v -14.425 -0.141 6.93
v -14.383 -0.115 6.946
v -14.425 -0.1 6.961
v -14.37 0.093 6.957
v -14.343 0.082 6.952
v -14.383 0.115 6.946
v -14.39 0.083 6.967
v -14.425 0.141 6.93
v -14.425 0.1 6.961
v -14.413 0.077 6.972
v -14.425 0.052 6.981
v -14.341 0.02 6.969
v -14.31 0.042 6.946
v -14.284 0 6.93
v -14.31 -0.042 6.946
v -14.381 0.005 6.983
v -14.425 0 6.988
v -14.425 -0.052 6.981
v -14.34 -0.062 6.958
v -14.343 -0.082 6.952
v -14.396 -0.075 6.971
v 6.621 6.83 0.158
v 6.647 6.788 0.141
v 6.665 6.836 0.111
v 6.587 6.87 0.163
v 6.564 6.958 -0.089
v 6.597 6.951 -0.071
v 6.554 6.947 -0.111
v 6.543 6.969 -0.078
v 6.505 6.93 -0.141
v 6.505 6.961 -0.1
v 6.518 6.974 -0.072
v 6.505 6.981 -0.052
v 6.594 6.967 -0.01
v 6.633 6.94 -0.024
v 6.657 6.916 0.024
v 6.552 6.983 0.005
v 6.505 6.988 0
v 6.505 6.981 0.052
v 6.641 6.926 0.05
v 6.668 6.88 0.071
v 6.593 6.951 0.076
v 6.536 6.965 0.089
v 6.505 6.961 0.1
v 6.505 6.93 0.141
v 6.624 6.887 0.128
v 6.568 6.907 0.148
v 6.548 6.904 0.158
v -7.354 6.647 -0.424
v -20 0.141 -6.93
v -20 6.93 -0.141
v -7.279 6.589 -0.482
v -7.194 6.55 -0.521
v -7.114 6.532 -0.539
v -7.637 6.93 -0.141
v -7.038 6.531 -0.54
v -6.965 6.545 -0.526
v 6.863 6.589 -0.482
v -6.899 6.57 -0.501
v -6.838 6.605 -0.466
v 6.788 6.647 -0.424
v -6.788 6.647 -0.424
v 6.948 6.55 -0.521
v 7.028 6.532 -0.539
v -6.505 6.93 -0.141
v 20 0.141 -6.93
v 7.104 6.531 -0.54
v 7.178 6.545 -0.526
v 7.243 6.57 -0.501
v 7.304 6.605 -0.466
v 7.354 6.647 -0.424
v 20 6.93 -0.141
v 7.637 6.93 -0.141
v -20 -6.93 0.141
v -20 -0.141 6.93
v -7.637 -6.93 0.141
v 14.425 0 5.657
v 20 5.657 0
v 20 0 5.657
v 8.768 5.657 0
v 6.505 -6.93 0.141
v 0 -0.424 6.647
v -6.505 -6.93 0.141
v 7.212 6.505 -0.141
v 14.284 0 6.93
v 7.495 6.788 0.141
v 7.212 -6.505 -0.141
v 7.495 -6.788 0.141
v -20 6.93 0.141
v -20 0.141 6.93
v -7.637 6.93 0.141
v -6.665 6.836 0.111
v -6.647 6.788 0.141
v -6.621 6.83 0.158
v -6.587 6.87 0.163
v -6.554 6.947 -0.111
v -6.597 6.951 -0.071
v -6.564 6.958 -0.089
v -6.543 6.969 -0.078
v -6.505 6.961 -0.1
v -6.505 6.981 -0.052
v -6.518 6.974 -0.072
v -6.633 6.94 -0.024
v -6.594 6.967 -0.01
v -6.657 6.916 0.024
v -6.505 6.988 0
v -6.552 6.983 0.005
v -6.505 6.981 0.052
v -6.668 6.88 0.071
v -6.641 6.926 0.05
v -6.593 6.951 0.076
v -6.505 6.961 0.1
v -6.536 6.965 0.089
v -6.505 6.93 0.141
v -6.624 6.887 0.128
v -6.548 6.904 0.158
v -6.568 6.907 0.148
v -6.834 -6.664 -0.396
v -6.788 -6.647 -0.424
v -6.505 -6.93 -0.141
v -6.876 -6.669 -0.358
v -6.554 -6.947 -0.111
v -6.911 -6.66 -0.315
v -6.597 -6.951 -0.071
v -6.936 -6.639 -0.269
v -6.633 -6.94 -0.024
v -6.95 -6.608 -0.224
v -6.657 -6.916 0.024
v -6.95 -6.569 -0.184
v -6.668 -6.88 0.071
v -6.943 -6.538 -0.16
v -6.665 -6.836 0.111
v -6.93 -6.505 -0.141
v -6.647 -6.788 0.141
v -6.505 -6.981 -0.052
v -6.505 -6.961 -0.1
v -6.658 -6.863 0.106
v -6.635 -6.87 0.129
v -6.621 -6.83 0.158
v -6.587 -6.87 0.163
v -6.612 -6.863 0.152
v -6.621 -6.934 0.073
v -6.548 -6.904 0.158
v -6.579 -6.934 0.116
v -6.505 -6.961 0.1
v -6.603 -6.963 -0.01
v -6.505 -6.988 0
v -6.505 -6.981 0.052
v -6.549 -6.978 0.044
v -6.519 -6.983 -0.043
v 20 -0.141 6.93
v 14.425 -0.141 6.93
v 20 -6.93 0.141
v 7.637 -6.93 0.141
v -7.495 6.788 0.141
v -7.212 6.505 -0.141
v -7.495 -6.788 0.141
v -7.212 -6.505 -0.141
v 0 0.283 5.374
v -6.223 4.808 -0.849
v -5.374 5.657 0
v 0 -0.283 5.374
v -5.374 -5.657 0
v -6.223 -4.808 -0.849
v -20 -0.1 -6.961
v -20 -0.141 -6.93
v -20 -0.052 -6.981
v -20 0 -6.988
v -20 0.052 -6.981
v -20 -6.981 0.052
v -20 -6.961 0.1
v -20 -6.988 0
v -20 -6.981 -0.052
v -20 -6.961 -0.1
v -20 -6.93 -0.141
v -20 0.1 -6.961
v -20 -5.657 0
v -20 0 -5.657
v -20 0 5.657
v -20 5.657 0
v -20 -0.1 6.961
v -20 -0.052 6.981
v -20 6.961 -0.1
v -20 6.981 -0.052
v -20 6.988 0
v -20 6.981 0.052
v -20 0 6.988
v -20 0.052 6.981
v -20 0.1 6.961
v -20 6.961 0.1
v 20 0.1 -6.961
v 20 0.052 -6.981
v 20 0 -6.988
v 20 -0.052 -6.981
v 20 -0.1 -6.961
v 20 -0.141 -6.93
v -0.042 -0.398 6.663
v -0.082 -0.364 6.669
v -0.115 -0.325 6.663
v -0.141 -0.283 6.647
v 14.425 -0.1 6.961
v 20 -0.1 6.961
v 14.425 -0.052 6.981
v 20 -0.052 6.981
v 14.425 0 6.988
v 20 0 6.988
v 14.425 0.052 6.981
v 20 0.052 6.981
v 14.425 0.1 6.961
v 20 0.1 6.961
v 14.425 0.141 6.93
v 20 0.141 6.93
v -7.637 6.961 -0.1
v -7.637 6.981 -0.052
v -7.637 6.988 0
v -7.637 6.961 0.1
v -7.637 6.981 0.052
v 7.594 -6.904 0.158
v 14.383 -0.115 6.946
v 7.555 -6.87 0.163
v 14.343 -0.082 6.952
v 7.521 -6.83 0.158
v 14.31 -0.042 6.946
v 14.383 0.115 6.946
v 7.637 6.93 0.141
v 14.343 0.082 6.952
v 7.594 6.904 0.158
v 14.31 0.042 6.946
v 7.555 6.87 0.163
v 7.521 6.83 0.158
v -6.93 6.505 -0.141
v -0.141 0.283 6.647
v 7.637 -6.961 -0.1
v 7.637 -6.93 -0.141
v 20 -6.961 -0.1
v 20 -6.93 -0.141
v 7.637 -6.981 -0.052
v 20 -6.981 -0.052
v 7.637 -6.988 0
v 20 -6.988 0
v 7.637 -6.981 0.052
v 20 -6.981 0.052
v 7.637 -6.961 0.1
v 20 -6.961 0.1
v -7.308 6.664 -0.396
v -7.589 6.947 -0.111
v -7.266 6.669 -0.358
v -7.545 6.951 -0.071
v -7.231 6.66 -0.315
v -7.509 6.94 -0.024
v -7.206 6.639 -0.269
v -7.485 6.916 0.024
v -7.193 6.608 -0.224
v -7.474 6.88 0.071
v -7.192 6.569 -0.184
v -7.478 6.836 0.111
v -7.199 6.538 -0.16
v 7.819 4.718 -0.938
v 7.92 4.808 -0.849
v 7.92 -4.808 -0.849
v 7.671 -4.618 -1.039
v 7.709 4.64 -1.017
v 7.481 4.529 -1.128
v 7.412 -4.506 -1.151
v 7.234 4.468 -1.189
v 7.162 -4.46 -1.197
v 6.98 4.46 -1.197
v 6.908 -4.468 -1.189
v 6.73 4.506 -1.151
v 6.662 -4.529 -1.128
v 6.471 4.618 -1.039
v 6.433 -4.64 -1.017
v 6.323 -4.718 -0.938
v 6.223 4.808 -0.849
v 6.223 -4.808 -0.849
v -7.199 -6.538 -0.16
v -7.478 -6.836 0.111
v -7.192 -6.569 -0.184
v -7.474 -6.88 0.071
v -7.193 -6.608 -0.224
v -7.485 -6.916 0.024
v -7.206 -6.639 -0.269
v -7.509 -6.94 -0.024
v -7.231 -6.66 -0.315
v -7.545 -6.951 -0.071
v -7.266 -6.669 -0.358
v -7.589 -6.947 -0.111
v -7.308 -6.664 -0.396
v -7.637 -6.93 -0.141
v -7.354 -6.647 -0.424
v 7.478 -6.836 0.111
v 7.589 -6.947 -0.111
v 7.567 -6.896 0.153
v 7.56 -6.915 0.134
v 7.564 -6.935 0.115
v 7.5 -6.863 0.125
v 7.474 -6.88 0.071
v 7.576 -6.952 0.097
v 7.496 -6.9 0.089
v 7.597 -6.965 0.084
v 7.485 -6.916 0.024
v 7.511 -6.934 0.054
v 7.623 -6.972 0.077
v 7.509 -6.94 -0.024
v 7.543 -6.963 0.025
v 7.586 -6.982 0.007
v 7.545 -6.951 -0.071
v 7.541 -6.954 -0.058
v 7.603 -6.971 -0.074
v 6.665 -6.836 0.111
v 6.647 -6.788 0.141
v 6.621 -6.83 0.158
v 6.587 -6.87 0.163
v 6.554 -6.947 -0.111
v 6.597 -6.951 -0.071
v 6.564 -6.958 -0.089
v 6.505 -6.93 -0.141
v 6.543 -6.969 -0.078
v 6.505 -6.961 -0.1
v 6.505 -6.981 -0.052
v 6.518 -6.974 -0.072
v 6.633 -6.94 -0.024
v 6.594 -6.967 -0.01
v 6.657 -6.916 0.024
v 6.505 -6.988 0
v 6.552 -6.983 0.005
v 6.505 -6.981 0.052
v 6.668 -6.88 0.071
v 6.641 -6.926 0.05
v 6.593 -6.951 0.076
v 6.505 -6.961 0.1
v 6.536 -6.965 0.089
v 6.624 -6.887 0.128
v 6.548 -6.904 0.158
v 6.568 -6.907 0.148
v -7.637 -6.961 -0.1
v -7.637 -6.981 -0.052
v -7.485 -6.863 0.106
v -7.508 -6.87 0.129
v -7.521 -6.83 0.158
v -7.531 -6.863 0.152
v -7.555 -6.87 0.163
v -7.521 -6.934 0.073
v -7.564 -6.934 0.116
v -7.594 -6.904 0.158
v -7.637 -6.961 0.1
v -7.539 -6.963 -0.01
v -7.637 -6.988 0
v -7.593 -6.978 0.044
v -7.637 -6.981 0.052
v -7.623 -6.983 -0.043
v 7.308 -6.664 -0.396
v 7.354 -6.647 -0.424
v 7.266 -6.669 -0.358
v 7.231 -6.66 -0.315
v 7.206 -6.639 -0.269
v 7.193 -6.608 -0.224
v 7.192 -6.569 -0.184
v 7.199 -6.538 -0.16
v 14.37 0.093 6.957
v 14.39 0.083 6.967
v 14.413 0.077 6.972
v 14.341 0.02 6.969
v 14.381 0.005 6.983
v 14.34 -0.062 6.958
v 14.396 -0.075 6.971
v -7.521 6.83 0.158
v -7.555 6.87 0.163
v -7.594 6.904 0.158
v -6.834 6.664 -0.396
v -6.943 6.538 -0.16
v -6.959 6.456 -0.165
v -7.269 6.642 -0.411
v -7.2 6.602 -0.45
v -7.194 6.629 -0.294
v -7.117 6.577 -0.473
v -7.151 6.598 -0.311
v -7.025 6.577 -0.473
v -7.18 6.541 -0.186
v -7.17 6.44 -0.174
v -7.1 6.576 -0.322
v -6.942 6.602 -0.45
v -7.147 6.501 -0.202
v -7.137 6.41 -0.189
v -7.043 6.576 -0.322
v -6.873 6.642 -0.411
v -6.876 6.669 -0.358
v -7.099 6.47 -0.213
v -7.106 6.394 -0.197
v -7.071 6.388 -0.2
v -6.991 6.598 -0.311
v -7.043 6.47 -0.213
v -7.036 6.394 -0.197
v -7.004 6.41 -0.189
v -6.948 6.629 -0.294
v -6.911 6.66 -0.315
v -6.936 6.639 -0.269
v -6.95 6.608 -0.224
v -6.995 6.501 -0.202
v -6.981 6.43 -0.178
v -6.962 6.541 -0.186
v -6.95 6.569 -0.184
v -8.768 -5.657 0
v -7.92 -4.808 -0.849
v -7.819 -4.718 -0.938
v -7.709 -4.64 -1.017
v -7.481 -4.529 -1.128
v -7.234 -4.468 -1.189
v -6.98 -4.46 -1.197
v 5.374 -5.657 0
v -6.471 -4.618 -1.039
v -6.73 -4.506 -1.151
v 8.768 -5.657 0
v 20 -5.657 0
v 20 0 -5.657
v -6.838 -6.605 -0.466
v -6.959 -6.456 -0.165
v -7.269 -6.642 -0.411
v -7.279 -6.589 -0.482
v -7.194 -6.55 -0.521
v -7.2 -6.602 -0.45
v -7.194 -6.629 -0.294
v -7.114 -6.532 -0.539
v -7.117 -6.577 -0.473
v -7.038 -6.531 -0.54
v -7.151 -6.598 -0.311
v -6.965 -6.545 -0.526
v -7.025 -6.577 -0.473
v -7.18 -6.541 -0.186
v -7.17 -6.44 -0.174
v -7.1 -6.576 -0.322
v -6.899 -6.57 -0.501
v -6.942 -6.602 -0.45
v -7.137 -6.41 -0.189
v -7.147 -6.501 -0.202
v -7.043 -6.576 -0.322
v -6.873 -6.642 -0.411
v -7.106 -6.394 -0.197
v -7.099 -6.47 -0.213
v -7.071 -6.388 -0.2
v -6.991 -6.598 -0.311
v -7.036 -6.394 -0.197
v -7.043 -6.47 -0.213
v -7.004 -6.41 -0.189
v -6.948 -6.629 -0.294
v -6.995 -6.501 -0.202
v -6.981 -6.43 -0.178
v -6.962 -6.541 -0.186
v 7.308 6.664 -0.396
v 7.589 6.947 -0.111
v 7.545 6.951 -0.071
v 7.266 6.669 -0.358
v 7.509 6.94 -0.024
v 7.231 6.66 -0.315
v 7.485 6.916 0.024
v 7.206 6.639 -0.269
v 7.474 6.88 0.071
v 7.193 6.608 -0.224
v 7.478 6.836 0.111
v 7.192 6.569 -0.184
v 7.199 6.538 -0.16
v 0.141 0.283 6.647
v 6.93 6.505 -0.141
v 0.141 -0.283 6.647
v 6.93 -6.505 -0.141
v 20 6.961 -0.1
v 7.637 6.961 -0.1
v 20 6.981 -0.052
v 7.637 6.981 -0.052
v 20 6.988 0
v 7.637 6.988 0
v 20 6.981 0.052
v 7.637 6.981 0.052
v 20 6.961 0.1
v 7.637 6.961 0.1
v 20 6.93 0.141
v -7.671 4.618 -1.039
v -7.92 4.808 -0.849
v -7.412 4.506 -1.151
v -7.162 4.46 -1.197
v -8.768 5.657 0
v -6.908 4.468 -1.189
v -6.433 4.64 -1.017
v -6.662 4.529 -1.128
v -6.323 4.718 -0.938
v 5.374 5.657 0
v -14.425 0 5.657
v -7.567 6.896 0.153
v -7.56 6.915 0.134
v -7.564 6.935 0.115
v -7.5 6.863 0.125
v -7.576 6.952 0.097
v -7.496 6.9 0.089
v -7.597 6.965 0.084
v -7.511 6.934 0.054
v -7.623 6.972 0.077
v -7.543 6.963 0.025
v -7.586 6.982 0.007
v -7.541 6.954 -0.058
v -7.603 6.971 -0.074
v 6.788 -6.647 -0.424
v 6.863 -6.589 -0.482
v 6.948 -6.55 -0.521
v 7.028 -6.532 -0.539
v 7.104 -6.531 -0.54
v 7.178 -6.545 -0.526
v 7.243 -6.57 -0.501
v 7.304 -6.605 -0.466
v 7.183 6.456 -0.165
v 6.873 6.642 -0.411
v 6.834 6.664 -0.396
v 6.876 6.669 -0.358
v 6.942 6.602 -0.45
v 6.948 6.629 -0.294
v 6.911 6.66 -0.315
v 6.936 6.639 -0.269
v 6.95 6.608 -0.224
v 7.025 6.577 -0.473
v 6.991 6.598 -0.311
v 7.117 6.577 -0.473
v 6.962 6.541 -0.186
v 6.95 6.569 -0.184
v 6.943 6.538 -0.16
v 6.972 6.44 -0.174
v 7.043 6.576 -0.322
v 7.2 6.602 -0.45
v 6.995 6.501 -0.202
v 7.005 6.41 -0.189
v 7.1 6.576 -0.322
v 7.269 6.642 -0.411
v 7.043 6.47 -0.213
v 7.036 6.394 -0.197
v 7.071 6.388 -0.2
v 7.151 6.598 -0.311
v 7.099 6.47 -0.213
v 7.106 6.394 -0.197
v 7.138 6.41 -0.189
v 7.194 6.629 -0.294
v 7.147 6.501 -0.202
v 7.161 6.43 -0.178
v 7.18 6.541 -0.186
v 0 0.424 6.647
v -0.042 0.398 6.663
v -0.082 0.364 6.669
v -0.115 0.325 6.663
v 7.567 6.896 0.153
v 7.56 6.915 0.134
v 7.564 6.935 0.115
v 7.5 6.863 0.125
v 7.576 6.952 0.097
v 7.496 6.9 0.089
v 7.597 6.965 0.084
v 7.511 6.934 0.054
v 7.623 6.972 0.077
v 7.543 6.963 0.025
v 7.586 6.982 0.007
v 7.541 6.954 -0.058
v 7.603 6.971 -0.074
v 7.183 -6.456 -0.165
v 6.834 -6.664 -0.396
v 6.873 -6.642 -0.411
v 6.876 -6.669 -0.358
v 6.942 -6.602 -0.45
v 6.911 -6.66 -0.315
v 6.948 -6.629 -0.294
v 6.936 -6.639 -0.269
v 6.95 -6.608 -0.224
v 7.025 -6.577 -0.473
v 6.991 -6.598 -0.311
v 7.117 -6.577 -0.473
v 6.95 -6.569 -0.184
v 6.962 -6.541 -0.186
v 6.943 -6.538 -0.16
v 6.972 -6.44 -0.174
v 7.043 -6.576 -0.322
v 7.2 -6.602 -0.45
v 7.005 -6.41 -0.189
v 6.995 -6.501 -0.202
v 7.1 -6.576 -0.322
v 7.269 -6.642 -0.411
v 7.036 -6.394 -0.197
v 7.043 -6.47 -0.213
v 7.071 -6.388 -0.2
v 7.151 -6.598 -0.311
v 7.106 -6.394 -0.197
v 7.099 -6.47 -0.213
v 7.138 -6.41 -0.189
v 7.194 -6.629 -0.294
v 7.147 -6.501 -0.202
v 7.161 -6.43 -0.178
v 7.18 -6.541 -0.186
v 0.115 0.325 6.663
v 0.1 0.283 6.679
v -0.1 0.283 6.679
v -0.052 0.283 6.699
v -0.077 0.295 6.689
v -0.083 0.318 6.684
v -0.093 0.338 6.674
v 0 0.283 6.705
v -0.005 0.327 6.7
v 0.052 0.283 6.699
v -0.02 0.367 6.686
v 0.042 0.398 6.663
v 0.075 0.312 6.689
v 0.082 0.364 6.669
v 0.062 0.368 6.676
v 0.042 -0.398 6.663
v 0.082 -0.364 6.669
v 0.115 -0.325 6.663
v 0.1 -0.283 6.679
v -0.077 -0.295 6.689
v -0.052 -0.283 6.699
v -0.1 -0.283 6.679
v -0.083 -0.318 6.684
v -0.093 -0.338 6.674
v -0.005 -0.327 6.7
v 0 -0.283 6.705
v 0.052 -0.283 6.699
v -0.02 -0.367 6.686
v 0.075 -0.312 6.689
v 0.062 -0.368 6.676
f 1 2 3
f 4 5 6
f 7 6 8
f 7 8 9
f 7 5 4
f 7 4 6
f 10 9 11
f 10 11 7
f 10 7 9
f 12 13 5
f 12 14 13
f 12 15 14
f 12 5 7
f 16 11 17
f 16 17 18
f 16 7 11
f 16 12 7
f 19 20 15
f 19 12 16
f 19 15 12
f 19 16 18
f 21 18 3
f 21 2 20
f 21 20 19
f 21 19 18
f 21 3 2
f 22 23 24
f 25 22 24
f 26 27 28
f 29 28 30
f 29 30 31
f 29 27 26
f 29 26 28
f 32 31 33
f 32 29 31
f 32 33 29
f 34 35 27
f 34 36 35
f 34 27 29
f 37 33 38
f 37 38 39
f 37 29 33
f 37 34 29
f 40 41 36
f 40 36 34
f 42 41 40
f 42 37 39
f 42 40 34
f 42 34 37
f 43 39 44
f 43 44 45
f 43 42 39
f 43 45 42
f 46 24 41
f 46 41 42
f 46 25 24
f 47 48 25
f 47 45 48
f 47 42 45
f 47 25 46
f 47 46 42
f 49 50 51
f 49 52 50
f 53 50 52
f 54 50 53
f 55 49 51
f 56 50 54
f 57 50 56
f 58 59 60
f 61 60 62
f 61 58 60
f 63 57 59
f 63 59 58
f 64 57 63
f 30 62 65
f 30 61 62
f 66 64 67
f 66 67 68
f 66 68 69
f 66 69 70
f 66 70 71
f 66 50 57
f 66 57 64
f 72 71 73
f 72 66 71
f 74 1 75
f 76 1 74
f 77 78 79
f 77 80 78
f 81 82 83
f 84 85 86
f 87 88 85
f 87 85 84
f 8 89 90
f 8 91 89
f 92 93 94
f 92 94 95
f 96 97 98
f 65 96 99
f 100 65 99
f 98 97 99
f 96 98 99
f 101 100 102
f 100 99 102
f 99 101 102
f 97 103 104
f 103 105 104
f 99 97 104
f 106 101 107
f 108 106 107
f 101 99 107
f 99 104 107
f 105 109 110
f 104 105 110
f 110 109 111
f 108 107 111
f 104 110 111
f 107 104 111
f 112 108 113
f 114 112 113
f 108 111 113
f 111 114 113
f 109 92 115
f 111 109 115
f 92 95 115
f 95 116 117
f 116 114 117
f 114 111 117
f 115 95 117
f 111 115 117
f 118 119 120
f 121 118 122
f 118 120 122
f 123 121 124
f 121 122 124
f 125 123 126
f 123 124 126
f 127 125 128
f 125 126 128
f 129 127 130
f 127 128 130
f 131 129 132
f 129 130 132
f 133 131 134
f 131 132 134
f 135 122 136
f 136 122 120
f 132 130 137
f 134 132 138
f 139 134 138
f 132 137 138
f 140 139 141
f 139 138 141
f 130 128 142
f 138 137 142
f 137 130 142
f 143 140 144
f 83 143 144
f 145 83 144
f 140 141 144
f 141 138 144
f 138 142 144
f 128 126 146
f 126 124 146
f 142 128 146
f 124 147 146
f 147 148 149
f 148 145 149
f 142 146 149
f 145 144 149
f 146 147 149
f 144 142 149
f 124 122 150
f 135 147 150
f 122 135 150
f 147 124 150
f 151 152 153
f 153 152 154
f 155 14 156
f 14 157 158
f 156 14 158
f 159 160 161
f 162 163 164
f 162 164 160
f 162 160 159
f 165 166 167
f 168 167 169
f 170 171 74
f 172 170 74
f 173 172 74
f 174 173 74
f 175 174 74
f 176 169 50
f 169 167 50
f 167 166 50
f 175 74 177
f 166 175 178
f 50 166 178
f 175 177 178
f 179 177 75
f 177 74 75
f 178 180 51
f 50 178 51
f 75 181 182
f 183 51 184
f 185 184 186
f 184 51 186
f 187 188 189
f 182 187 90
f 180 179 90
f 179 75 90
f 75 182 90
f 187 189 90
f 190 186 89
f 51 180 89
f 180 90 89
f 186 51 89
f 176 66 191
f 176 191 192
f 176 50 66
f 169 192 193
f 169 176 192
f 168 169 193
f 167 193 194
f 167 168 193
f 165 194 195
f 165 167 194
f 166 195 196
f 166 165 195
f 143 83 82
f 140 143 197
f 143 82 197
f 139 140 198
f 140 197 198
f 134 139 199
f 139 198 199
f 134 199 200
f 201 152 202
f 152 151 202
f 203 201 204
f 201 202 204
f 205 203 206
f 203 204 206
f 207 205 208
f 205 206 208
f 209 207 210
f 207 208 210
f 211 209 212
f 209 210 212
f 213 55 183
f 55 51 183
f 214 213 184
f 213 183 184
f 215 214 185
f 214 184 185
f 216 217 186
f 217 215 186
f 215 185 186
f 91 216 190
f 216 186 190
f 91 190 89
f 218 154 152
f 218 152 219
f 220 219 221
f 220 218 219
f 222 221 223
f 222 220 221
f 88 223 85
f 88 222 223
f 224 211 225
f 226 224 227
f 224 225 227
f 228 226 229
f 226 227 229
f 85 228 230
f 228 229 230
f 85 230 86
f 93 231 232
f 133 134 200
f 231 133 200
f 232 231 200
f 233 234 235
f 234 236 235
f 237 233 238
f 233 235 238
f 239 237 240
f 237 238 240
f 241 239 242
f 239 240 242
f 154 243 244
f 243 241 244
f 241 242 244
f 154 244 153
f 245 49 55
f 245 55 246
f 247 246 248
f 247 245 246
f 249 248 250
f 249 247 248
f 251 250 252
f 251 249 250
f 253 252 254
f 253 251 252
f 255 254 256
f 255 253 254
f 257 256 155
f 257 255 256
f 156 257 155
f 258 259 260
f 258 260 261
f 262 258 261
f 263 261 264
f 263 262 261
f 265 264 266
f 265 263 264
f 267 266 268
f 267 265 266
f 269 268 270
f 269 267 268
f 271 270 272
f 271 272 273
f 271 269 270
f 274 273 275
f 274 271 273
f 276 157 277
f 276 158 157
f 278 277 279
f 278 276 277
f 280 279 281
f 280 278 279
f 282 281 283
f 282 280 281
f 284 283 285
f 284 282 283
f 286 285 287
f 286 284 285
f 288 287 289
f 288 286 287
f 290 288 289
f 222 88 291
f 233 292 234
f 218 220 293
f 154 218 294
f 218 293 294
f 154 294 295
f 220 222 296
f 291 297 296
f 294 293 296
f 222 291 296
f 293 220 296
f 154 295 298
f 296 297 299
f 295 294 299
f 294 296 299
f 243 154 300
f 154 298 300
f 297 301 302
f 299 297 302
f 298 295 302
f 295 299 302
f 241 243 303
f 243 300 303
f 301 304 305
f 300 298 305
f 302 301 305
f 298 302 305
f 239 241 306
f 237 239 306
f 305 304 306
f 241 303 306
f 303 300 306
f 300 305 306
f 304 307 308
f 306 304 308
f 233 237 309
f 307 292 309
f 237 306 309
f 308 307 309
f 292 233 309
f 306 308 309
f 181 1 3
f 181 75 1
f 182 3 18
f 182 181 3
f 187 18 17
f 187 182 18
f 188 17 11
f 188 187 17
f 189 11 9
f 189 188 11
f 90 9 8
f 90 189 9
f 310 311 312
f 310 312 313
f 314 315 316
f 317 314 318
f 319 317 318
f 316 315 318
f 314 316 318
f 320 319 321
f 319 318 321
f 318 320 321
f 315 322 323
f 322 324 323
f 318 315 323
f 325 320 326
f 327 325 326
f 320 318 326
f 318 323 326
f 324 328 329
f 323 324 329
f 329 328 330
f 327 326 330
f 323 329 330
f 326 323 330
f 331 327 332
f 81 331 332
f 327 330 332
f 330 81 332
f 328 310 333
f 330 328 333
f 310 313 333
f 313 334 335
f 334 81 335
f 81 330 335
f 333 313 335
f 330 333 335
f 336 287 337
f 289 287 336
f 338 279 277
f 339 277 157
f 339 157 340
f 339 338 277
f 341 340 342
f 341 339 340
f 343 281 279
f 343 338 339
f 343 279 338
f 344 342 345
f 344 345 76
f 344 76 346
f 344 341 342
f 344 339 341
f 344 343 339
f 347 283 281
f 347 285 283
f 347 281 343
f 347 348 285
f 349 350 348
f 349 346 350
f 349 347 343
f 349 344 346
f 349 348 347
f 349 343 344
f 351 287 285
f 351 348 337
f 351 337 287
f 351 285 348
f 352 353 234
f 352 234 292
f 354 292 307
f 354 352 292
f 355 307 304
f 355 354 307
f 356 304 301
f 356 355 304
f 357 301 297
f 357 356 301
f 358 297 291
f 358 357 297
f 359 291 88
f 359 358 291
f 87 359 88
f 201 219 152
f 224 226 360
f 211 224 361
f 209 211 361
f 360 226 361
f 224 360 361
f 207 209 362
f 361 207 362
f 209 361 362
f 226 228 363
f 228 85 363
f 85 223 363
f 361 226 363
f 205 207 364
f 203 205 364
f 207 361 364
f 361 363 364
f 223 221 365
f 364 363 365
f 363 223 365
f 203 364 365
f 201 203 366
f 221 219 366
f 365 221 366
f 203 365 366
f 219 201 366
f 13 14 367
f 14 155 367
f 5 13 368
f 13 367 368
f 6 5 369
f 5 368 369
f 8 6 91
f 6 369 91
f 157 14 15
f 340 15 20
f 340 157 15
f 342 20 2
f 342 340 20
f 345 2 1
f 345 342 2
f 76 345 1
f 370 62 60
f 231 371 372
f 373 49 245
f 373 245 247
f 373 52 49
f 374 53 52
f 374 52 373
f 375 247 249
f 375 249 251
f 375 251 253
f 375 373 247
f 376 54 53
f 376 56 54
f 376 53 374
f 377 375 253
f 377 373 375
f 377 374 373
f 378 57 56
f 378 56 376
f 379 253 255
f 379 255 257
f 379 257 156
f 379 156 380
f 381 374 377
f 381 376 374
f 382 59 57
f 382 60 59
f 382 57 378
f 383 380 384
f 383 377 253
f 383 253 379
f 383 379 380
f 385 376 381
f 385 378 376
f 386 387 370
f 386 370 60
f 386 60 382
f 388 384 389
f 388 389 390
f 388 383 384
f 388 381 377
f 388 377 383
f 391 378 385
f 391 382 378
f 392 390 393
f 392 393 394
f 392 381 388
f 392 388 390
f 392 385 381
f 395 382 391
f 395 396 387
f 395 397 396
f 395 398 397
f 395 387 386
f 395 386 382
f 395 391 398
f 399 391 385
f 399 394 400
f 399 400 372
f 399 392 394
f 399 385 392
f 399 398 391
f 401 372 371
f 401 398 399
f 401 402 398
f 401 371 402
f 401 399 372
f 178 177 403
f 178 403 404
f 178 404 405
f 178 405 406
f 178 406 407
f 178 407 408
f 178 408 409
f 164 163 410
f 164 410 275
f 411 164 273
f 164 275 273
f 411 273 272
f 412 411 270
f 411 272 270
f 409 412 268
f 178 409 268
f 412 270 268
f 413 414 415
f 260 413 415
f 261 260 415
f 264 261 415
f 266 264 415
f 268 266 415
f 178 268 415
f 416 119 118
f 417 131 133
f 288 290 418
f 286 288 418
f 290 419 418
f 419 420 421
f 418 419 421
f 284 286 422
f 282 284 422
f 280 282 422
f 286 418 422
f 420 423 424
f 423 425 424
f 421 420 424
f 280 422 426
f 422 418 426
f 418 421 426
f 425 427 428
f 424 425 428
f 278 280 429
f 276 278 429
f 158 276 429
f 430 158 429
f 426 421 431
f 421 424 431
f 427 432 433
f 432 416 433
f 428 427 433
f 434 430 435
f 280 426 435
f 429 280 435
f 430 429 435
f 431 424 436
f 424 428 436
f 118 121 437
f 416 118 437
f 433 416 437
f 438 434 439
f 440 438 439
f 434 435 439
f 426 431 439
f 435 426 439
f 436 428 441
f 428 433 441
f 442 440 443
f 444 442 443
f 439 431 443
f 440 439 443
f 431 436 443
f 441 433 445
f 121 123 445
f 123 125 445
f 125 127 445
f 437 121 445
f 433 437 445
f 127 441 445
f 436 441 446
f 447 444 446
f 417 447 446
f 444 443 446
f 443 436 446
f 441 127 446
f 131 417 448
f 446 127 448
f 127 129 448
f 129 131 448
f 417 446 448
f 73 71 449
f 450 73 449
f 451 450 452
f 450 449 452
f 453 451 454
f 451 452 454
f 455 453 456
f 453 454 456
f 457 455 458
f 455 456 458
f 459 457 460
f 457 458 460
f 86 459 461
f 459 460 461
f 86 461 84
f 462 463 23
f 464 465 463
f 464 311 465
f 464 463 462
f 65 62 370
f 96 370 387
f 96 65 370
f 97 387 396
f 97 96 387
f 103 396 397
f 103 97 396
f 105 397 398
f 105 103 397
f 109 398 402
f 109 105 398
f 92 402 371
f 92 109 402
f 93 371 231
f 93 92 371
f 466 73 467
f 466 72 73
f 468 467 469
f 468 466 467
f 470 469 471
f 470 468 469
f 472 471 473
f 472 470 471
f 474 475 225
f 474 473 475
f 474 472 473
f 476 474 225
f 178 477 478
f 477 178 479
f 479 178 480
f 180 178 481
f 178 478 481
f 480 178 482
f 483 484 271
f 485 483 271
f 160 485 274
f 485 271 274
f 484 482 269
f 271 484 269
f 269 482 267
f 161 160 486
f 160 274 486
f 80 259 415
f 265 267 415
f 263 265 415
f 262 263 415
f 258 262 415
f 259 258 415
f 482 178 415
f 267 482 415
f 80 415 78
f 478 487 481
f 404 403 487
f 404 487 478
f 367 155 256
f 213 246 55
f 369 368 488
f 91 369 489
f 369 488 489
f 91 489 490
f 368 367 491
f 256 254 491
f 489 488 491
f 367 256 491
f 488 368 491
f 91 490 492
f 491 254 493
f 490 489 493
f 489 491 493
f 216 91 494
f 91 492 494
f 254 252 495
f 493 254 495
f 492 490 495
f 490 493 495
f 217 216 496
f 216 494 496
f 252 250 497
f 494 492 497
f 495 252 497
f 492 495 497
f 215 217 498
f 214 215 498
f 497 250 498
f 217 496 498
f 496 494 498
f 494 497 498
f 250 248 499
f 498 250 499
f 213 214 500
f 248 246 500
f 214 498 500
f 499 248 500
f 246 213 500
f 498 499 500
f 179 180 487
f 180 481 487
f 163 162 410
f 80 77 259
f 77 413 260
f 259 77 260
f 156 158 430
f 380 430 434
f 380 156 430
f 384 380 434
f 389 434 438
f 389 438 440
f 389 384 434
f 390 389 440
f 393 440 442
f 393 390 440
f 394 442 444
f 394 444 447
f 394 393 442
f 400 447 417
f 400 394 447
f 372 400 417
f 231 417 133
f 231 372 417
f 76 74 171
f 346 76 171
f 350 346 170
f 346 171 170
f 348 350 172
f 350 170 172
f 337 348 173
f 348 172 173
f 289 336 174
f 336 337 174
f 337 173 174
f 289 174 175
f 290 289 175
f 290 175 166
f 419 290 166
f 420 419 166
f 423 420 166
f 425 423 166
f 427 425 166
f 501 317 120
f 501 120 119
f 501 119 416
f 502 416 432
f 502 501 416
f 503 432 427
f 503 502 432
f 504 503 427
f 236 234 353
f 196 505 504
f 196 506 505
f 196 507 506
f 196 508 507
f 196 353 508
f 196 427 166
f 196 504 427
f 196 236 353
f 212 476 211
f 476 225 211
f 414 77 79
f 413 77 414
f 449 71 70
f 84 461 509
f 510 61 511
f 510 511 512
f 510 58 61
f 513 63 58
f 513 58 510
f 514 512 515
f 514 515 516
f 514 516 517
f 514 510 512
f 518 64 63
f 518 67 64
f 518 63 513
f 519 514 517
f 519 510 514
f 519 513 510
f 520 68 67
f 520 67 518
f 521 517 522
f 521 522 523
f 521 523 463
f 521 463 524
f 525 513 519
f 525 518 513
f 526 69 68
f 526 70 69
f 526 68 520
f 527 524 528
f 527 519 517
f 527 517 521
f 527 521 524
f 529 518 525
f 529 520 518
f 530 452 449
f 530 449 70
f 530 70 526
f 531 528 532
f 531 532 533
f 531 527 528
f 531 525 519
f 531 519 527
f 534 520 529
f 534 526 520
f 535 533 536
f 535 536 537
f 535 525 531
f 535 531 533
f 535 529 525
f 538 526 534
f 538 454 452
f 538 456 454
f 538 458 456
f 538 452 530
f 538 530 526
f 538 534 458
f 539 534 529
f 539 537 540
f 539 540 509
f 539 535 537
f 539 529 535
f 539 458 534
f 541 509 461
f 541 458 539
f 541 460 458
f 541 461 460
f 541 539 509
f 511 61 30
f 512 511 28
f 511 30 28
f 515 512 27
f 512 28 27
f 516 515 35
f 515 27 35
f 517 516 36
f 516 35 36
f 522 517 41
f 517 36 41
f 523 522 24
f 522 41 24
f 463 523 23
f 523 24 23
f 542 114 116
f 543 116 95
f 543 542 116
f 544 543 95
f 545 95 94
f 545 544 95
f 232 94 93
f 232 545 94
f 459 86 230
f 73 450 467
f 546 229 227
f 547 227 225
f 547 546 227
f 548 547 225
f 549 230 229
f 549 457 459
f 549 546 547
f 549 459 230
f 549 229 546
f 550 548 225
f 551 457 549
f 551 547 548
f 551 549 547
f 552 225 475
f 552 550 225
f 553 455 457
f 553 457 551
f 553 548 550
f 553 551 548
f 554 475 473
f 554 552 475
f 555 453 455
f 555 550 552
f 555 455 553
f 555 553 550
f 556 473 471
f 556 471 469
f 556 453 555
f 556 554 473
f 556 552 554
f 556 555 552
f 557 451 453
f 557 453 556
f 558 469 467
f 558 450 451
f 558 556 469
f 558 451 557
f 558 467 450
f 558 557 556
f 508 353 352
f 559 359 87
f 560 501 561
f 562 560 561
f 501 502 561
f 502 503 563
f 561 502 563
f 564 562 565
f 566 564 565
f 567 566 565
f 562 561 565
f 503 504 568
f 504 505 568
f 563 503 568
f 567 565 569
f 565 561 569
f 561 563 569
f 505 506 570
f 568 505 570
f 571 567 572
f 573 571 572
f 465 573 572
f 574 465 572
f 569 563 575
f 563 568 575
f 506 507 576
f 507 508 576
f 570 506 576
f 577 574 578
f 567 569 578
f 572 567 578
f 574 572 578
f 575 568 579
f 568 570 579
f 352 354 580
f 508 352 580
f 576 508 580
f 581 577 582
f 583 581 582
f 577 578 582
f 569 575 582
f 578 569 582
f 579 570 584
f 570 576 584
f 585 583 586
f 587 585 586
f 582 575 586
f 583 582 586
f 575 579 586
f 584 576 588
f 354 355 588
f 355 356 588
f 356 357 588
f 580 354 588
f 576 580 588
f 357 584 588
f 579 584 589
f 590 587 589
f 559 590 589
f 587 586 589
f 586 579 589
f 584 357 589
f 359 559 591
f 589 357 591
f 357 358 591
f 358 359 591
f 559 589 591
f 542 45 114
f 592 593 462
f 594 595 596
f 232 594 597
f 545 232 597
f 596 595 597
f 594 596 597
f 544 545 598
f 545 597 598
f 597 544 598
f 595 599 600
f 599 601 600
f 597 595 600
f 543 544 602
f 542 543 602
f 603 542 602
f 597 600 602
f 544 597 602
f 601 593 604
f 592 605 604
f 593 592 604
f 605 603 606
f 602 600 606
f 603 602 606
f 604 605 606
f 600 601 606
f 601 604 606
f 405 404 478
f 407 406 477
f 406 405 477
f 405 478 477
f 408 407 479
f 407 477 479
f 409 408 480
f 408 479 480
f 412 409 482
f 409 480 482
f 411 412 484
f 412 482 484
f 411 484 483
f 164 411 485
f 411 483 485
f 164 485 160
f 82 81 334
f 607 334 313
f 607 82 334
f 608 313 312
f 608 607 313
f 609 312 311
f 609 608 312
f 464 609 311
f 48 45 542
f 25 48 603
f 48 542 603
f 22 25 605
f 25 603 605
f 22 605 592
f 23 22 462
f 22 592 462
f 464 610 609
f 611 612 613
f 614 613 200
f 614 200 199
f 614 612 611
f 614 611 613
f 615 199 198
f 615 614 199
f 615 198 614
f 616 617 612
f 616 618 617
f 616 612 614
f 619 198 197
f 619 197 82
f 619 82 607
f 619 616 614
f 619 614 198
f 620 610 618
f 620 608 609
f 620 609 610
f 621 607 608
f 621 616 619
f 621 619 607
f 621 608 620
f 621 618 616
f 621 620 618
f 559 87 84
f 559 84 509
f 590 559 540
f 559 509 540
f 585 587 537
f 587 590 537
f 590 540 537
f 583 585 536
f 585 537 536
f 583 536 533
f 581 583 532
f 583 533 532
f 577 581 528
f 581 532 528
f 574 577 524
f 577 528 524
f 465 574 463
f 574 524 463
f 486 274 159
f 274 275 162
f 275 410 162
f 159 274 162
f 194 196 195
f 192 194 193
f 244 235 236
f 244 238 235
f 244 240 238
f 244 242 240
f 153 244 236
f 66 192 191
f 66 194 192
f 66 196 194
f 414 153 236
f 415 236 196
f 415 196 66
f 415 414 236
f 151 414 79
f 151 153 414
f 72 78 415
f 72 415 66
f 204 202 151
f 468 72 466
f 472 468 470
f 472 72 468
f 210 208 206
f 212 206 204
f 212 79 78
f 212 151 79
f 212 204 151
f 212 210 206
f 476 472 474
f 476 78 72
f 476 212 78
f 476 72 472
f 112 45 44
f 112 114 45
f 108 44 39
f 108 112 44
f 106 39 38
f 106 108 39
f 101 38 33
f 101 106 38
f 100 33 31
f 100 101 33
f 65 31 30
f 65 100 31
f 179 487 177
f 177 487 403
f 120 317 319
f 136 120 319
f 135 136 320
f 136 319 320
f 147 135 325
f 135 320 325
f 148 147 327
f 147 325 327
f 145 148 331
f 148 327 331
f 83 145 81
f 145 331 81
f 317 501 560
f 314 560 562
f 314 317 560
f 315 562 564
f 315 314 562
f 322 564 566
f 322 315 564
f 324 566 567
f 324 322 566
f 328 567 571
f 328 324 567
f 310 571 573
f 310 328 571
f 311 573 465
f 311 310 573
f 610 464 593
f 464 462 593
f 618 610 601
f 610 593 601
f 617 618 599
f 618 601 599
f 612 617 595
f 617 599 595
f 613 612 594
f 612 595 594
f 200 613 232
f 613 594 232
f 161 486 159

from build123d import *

# Parameters (mm, degrees)
F1_DEPTH      = 20
F4_DEPTH      = 7.0720678119
F4_DEPTH_BACK = 7.0720678119
F8_R          = 0.2
F9_T          = -1


# Not quite as in the source:
# - the program builds the solid bodies; features that only make, move or delete a surface that nothing else refers to are left out


with BuildPart() as f1:
    # F0 (on Right) → F1 (new body)
    with BuildSketch(Plane.YZ):
        Polygon((7.0710678119, 0), (0, 7.0710678119), (-7.0710678119, 0), (0, -7.0710678119), align=None)
    extrude(amount=F1_DEPTH)

    # F3 (on 3pt) → F4 (cut, two sides)
    with BuildSketch(Plane(origin=(0, 0, 0), x_dir=(-1, 0, 0), z_dir=(0, 1, 0))) as f4_sk:
        Polygon((0.2828427125, 7.0710678119), (-7.0710678119, 14.4249783362), (-14.4249783362, 7.0710678119), (-7.0710678119, -0.2828427125), align=None)
    extrude(amount=-F4_DEPTH, mode=Mode.SUBTRACT)
    extrude(f4_sk.sketch, amount=F4_DEPTH_BACK, mode=Mode.SUBTRACT)

    # F7: F1 across face


with BuildPart() as f1_1:
    add(f1.part)
    add(f1.part.mirror(Plane(origin=(0, 0, -0.0055104131), x_dir=(0, 1, 0), z_dir=(-1, 0, 0))))

    # F8
    f8_edges = [f1_1.edges().sort_by_distance(p)[0] for p in [
        (7.071068, 0, -0.282843),
        (3.394113, -3.676955, 3.394113),
        (3.394113, 3.676955, 3.394113),
        (0, 0, 6.788225),
        (6.929646, -6.929646, -0.141421),
        (6.929646, 6.929646, -0.141421),
        (7.212489, 6.929646, -0.141421),
        (7.212489, -6.929646, -0.141421),
        (10.889444, -3.535534, 3.535534),
        (10.889444, 3.535534, 3.535534),
        (17.212489, 0, 7.071068),
        (13.676955, 7.071068, 0),
        (13.676955, -7.071068, 0),
        (0, -7.071068, 0),
        (-13.676955, -7.071068, 0),
        (-7.212489, -6.929646, -0.141421),
        (-6.929646, -6.929646, -0.141421),
        (-10.889444, -3.535534, 3.535534),
        (-3.394113, -3.676955, 3.394113),
        (-3.394113, 3.676955, 3.394113),
        (-7.071068, 0, -0.282843),
        (-7.212489, 6.929646, -0.141421),
        (-6.929646, 6.929646, -0.141421),
        (-10.889444, 3.535534, 3.535534),
        (-17.212489, 0, 7.071068),
        (-13.676955, 7.071068, 0),
        (0, 7.071068, 0),
        (0, 0, -7.071068),
    ]]
    fillet(f8_edges, radius=F8_R)

    # F9
    f9_openings = [f1_1.faces().sort_by_distance(p)[0] for p in [
        (20, 0, 0),
        (-20, 0, 0),
    ]]
    offset(amount=F9_T, openings=f9_openings)


solid = f1_1.part
